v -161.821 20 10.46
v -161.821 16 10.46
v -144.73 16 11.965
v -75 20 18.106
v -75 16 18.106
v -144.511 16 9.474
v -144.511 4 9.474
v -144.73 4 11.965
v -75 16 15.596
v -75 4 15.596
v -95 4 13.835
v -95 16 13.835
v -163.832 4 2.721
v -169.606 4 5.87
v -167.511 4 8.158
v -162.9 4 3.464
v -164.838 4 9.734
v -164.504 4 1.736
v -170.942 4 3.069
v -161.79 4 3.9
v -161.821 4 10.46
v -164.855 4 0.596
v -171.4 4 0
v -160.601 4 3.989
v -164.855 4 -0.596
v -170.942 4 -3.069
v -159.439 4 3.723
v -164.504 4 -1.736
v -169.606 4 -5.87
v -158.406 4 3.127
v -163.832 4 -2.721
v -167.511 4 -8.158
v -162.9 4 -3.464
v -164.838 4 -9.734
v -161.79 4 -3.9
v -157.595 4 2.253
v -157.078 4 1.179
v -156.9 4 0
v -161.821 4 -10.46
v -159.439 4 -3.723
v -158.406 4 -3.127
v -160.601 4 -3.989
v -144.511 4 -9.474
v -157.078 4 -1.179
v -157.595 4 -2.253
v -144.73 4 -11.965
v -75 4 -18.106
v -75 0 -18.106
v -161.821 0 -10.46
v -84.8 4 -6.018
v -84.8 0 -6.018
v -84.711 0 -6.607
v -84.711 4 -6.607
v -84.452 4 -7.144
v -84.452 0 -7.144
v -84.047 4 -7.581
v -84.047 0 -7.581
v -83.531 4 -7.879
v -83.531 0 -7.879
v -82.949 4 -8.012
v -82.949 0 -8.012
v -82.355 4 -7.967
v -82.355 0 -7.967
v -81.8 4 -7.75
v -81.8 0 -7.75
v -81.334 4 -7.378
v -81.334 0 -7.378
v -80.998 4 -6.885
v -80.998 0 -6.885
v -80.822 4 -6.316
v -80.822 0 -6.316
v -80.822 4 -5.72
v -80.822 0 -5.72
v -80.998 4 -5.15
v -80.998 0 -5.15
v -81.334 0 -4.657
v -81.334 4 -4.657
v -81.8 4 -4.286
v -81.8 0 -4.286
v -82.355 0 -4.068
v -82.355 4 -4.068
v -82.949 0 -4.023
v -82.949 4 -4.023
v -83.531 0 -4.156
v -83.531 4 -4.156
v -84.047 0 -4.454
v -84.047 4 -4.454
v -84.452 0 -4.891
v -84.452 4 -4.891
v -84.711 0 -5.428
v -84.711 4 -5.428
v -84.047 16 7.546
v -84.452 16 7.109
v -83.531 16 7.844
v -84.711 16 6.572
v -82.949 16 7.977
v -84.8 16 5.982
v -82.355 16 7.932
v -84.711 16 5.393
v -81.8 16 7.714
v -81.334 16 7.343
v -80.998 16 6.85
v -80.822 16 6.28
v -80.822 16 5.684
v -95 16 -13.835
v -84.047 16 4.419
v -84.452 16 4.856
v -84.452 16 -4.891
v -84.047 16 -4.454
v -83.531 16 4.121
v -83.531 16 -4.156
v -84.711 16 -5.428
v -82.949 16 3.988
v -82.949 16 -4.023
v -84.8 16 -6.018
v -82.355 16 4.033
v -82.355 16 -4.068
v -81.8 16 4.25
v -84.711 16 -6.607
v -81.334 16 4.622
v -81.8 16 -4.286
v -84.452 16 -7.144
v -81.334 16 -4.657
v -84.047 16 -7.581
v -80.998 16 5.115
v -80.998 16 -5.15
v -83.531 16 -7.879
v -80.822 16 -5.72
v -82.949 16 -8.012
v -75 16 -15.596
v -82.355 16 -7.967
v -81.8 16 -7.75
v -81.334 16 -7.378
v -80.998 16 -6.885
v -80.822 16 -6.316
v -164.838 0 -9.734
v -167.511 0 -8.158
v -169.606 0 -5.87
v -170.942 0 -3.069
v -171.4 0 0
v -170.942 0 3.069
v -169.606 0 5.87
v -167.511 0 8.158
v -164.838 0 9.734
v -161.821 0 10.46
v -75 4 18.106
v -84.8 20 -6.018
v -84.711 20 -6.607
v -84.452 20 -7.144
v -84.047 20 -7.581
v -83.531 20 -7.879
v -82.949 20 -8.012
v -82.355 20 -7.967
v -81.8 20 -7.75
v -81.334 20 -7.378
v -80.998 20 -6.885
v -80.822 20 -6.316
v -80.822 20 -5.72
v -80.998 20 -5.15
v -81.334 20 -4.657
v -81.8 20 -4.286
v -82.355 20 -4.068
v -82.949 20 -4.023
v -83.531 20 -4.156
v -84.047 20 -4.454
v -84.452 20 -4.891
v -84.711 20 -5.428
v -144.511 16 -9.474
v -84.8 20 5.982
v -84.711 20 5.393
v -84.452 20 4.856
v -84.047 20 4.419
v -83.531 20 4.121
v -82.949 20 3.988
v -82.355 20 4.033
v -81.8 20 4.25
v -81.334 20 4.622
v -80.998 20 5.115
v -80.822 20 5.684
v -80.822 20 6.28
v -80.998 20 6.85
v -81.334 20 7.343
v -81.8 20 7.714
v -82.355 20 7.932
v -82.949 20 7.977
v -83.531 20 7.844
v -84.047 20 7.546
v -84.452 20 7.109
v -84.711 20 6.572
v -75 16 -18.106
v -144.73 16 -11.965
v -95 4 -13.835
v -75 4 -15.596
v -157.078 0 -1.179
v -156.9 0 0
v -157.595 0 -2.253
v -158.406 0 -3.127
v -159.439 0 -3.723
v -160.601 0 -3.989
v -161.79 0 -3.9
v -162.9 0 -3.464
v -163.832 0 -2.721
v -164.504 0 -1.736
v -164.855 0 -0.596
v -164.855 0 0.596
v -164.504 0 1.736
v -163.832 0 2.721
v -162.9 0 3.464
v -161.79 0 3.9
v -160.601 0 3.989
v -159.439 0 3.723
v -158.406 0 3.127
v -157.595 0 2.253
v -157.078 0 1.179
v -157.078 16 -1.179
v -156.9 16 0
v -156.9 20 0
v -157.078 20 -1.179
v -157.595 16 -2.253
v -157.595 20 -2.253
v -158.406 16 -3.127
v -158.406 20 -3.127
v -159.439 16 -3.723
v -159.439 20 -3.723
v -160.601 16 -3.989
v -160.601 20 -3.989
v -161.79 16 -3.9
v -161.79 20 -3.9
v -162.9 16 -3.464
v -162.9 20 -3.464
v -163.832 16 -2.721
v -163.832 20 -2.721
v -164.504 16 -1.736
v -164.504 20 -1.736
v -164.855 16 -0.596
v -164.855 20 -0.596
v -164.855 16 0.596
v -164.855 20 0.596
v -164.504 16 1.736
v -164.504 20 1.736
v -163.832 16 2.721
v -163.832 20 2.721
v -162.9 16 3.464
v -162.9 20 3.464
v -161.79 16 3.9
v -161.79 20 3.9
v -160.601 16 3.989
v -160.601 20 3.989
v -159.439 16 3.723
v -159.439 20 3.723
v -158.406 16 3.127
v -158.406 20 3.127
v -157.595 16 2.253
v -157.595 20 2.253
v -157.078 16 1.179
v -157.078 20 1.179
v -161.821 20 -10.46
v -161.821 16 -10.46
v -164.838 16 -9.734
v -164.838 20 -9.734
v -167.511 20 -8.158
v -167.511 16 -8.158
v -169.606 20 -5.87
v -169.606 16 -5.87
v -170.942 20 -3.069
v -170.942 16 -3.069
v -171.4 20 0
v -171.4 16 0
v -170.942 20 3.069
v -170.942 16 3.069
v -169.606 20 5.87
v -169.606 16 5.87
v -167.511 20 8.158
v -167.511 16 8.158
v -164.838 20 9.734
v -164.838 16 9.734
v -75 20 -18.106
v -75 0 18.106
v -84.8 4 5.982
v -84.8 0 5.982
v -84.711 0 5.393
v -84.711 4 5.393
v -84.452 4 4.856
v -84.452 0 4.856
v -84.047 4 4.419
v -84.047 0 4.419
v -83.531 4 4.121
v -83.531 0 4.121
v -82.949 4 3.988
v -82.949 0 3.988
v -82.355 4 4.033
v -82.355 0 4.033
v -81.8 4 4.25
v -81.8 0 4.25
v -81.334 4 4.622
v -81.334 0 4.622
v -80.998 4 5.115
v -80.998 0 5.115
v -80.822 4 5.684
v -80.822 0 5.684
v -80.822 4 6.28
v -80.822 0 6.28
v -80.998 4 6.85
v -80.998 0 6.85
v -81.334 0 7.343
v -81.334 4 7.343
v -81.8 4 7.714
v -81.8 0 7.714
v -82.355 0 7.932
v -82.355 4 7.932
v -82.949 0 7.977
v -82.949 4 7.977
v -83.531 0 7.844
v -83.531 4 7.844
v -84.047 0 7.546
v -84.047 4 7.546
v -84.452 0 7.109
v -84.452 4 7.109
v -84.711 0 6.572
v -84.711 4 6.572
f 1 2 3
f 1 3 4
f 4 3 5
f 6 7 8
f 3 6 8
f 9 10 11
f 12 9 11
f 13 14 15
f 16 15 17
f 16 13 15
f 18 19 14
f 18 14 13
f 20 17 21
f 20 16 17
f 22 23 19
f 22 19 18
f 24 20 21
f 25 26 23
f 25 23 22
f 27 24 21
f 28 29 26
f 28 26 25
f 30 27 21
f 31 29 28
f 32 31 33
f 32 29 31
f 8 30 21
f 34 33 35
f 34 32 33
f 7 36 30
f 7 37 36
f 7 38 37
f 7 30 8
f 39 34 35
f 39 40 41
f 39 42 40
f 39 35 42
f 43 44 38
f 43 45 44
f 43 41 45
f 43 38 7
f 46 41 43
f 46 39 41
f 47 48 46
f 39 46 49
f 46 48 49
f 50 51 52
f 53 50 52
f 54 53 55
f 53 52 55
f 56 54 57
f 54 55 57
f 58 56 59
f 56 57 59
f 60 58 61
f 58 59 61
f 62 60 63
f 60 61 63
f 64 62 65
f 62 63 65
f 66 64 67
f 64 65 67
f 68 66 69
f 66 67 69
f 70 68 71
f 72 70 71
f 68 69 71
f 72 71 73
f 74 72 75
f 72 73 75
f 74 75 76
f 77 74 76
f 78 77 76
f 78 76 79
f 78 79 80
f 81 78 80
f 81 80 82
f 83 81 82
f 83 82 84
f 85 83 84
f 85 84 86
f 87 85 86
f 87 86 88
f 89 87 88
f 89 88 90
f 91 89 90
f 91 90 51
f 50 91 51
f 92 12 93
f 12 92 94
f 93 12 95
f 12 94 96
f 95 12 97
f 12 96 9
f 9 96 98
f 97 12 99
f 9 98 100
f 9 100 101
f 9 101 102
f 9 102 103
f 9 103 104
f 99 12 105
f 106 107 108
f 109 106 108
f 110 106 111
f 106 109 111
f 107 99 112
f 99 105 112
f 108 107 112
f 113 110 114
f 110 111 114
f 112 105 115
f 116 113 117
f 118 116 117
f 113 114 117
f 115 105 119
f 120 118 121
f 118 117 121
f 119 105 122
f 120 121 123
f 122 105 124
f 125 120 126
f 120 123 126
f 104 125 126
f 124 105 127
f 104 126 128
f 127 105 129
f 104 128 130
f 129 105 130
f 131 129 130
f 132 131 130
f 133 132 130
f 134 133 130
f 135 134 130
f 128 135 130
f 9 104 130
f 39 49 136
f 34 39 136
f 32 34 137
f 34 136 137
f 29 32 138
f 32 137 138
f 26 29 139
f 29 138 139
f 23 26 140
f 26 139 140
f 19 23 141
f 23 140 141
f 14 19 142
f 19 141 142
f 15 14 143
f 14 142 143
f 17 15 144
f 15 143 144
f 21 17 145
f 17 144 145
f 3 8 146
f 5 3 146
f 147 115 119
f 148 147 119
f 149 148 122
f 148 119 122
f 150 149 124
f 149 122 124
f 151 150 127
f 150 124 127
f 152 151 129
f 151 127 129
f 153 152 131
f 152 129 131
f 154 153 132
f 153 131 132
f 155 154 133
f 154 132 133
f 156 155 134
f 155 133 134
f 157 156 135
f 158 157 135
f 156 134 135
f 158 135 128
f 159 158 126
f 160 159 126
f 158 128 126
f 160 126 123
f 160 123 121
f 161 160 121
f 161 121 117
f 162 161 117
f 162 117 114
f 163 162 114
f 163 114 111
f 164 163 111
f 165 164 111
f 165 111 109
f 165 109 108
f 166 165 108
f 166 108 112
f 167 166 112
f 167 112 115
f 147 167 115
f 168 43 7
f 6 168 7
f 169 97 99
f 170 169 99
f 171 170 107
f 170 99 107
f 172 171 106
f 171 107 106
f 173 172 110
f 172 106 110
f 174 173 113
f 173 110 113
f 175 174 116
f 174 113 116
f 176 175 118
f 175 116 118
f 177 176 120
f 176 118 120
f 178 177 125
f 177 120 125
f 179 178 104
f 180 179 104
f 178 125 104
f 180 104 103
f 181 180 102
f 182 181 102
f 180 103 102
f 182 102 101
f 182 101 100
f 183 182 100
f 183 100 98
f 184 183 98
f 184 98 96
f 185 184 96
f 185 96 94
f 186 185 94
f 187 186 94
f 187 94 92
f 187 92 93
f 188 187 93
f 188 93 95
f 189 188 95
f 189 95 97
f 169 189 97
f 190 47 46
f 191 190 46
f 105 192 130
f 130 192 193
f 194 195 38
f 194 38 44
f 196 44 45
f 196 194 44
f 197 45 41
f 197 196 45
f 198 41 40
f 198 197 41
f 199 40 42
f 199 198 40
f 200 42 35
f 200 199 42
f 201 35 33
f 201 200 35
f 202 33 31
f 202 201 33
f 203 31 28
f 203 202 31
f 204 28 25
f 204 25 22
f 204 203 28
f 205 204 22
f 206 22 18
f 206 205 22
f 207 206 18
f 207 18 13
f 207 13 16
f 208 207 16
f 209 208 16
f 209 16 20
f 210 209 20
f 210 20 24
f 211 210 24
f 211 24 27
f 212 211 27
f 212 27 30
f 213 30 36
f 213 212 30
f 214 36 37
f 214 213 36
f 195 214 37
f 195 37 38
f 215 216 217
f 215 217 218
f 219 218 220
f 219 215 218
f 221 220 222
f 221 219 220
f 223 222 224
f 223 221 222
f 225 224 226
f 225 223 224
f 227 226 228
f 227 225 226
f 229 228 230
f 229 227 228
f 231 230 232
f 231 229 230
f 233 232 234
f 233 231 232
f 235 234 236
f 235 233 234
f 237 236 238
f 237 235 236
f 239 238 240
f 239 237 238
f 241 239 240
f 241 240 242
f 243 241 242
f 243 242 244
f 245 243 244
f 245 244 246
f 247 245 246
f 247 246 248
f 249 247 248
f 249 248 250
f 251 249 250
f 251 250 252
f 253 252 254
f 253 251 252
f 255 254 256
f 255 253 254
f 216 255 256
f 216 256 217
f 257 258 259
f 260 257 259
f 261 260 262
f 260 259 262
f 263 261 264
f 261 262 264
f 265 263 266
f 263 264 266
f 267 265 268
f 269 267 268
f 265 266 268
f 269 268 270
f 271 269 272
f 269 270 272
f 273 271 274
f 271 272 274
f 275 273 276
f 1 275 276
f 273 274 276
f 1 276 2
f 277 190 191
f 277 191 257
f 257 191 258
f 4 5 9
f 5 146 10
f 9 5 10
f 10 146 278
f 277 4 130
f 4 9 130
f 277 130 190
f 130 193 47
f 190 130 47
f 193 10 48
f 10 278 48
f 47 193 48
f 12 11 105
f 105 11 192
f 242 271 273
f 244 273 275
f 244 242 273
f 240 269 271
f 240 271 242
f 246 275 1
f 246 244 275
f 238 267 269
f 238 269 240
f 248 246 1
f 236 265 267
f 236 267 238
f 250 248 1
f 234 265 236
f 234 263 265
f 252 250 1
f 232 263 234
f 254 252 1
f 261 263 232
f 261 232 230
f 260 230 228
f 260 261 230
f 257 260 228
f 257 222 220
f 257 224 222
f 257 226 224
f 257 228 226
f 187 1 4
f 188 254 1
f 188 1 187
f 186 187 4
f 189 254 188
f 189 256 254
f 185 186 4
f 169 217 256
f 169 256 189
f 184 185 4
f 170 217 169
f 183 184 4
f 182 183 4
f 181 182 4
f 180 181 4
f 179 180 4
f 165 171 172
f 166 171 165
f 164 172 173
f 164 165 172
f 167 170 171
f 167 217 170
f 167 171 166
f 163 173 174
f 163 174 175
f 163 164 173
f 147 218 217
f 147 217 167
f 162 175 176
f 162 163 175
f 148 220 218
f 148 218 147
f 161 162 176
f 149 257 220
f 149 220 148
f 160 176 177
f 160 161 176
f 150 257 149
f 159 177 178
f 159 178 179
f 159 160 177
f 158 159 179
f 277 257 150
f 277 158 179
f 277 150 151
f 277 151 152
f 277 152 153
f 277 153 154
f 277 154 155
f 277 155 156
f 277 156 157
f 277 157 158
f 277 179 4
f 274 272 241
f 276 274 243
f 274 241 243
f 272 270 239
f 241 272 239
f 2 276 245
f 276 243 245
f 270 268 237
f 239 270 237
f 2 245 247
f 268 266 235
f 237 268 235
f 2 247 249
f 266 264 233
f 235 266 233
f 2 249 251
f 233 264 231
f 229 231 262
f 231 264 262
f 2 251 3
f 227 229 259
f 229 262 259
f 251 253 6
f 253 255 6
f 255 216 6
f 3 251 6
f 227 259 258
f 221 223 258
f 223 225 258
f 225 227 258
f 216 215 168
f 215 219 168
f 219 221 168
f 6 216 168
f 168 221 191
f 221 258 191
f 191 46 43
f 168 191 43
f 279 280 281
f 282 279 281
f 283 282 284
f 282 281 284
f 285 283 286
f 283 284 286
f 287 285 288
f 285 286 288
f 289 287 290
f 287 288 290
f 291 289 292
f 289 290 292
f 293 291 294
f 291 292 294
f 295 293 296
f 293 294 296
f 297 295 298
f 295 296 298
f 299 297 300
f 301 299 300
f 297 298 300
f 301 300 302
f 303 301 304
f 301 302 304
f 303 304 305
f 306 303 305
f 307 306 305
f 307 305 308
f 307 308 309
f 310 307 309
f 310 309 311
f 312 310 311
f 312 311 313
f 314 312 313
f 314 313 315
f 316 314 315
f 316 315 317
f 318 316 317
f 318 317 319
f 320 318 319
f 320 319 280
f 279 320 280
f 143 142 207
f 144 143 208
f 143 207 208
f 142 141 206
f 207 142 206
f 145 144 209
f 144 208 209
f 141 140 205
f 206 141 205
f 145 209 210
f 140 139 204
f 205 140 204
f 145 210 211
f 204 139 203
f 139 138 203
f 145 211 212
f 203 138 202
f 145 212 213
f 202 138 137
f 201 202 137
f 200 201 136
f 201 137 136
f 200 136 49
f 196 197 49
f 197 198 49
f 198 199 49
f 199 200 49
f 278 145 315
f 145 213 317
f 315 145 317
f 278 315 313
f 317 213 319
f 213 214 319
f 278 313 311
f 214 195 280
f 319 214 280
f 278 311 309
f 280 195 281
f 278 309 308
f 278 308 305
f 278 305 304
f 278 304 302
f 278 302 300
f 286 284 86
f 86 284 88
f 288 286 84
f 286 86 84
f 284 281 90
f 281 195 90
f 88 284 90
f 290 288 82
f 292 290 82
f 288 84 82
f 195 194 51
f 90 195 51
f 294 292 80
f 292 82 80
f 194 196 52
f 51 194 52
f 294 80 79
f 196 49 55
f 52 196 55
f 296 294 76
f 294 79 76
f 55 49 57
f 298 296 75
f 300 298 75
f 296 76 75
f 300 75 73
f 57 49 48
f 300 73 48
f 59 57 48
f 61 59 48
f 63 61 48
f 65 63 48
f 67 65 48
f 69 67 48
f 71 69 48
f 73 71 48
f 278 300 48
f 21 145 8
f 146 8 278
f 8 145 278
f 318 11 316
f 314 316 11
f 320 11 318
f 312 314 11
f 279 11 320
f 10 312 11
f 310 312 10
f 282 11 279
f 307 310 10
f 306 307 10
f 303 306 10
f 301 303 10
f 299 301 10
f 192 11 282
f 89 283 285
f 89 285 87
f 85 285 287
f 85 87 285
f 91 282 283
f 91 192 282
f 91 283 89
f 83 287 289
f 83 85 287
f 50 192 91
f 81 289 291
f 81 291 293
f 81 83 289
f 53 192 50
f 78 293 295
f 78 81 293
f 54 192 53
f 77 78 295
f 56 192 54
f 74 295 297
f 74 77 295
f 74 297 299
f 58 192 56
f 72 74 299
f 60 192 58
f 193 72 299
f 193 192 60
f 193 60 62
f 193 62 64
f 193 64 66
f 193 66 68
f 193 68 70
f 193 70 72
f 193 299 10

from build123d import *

# Parameters (mm, degrees)
SKETCH1_R           = 4
BOSS_EXTRUDE1_DEPTH = 4
SKETCH2_R           = 4
BOSS_EXTRUDE2_DEPTH = 4
BOSS_EXTRUDE5_DEPTH = 12
SKETCH6_R           = 2
CUT_EXTRUDE1_DEPTH  = 21
BOSS_EXTRUDE6_DEPTH = 12


with BuildPart() as part:
    # Sketch1 → Boss-Extrude1 (new body)
    with BuildSketch(Plane(origin=(0, 0, 0), x_dir=(1, 0, 0), z_dir=(0, 1, 0))):
        with BuildLine():
            Line((-75, 18.10605947), (-161.821193893, 10.459512504))
            ThreePointArc((-161.821193893, 10.459512504), (-171.4, 0), (-161.821193893, -10.459512504))
            Line((-161.821193893, -10.459512504), (-75, -18.10605947))
            Line((-75, -18.10605947), (-75, 18.10605947))
        make_face()
        with Locations((-160.9, 0)):
            Circle(SKETCH1_R, mode=Mode.SUBTRACT)
    extrude(amount=BOSS_EXTRUDE1_DEPTH)



with BuildPart() as body_2:
    # Sketch2 → Boss-Extrude2 (new body)
    with BuildSketch(Plane(origin=(0, 16, 0), x_dir=(1, 0, 0), z_dir=(0, 1, 0))):
        with BuildLine():
            Line((-75, 18.10605947), (-161.821193893, 10.459512504))
            ThreePointArc((-161.821193893, 10.459512504), (-171.4, 0), (-161.821193893, -10.459512504))
            Line((-161.821193893, -10.459512504), (-75, -18.10605947))
            Line((-75, -18.10605947), (-75, 18.10605947))
        make_face()
        with Locations((-160.9, 0)):
            Circle(SKETCH2_R, mode=Mode.SUBTRACT)
    extrude(amount=BOSS_EXTRUDE2_DEPTH)


with BuildPart() as part_1:
    add(part.part)

    add(body_2.part)  # Boss-Extrude5 merges body 2
    # Sketch5 → Boss-Extrude5 (add)
    with BuildSketch(Plane(origin=(0, 4, 0), x_dir=(1, 0, 0), z_dir=(0, 1, 0))):
        Polygon((-75, -18.10605947), (-75, -15.596382275), (-144.510751478, -9.47440673), (-144.730083357, -11.964766849), align=None)
        Polygon((-75, 15.596382275), (-75, 18.10605947), (-144.730083357, 11.964766849), (-144.510751478, 9.47440673), align=None)
    extrude(amount=BOSS_EXTRUDE5_DEPTH)

    # Sketch6 → Cut-Extrude1 (cut, through all)
    with BuildSketch(Plane(origin=(0, 0, 0), x_dir=(-1, 0, 0), z_dir=(0, -1, 0))):
        with Locations((82.8, -5.982385529)):
            Circle(SKETCH6_R)
        with Locations((82.8, 6.017614471)):
            Circle(SKETCH6_R)
    extrude(amount=-CUT_EXTRUDE1_DEPTH, mode=Mode.SUBTRACT)

    # Sketch7 → Boss-Extrude6 (add)
    with BuildSketch(Plane(origin=(0, 4, 0), x_dir=(1, 0, 0), z_dir=(0, 1, 0))):
        Polygon((-144.510751478, 9.47440673), (-144.510751478, -9.47440673), (-95, -13.834935185), (-95, 13.834935185), align=None)
    extrude(amount=BOSS_EXTRUDE6_DEPTH)


solid = part_1.part
